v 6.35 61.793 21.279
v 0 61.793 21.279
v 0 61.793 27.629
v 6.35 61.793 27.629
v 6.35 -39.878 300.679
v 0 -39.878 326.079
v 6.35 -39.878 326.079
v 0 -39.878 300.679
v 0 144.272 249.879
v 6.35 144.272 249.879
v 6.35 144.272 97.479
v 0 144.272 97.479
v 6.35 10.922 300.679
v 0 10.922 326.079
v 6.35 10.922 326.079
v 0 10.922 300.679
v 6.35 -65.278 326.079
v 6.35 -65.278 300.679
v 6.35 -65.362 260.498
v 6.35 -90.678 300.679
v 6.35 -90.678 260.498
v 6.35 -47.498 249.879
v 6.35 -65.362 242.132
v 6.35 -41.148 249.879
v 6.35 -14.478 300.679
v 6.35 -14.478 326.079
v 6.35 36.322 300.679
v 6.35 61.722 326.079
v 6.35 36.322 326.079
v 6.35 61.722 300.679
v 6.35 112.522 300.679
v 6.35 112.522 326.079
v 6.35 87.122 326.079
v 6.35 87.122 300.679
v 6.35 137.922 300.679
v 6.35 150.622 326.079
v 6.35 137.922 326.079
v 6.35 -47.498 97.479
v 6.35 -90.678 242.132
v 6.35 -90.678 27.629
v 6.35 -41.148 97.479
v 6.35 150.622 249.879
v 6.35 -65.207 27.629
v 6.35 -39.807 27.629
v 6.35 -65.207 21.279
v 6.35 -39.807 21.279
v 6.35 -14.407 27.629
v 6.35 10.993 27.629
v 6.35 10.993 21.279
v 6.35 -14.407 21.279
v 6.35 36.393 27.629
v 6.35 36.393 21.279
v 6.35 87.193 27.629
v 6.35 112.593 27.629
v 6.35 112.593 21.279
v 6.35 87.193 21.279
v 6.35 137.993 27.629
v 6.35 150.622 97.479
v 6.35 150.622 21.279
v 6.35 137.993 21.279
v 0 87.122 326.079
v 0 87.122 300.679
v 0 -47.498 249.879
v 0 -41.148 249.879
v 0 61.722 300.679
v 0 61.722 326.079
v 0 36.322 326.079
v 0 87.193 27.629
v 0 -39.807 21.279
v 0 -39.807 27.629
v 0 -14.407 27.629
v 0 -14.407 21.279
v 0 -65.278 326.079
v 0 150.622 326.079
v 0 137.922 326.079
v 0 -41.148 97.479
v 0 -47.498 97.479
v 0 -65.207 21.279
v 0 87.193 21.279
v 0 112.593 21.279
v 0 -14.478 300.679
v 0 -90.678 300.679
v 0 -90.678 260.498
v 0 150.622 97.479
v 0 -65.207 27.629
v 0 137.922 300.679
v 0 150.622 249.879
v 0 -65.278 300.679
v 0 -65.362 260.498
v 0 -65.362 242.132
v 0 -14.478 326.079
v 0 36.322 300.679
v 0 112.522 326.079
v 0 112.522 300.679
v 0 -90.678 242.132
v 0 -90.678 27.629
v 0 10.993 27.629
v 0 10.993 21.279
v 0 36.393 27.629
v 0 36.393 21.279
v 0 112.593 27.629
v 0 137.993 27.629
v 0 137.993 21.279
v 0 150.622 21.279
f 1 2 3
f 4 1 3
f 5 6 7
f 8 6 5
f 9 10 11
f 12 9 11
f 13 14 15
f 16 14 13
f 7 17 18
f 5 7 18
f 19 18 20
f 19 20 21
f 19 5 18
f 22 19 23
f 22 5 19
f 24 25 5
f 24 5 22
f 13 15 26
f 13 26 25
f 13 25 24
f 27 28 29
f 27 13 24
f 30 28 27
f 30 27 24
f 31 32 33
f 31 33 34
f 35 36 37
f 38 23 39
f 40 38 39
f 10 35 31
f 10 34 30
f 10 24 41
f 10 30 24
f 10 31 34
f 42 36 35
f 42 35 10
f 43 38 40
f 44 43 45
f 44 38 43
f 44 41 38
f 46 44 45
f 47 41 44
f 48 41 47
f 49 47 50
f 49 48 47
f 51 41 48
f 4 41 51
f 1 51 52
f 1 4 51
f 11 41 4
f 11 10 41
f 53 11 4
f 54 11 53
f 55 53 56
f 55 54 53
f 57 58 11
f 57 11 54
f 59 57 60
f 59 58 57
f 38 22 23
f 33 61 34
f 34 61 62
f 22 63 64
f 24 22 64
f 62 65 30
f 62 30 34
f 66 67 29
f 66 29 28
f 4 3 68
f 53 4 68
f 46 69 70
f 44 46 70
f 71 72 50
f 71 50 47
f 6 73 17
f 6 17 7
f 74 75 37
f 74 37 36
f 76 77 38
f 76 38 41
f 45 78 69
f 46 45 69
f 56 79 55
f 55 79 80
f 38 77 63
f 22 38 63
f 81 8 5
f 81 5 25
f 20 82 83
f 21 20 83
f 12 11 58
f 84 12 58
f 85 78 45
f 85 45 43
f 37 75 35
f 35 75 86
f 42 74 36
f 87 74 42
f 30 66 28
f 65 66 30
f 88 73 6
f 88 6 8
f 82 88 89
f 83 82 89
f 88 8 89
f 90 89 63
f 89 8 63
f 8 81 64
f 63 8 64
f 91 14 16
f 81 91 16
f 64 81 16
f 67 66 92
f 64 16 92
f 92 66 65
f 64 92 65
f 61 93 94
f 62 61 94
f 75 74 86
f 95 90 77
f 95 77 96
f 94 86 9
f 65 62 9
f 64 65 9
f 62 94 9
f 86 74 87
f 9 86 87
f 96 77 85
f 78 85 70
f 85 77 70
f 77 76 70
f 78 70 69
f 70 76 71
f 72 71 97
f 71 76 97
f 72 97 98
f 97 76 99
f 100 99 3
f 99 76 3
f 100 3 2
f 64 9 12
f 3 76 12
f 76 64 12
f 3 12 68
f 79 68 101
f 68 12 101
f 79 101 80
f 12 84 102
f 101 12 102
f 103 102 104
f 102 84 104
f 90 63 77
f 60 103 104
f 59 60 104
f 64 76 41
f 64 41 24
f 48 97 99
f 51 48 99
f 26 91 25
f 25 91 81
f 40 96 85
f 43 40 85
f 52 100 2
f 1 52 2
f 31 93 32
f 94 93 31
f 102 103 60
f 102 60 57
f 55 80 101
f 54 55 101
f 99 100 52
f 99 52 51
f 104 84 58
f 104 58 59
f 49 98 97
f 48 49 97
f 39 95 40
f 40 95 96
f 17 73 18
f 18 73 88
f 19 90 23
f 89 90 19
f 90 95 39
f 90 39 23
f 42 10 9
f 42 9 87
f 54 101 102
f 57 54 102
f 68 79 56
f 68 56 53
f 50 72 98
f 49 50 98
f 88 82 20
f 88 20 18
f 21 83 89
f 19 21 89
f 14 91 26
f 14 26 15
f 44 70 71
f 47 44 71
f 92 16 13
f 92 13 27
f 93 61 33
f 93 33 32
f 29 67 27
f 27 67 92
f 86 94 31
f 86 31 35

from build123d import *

# Parameters (mm, degrees)
SKETCH1_W                = 304.8
SKETCH1_H                = 241.3
BOSS_EXTRUDE4_DEPTH      = 6.35
SKETCH3_W                = 6.35
SKETCH3_H                = 25.470512821
SKETCH3_H_2              = 25.4
SMALL_TEETH_CUT_DEPTH    = 7.62
BIG_TEETH_CUT_DEPTH      = 360.242006362
BIG_TEETH_CUT_DEPTH_BACK = 360.242006362
BIG_TEETH_W              = 25.4
BIG_TEETH_H              = 25.4
SKETCH4_W                = 152.4
SKETCH4_H                = 6.35
CUT_EXTRUDE1_DEPTH       = 360.242006362
SKETCH5_W                = 18.365609198
SKETCH5_H                = 25.315792254
CUT_EXTRUDE2_DEPTH       = 360.242006362
SKETCH6_W                = 152.4
SKETCH6_H                = 6.35
CUT_EXTRUDE3_DEPTH       = 360.242006362


with BuildPart() as part:
    # Sketch1 → Boss-Extrude4 (new body)
    with BuildSketch(Plane(origin=(0, 0, 0), x_dir=(0, 0, -1), z_dir=(1, 0, 0))):
        with Locations((-173.678767452, 29.972488533)):
            Rectangle(SKETCH1_W, SKETCH1_H)
    extrude(amount=BOSS_EXTRUDE4_DEPTH)

    # Sketch3 → Small_teeth_cut (cut)
    with BuildSketch(Plane.ZY):
        with Locations((24.453767452, -77.942255057)):
            Rectangle(SKETCH3_W, SKETCH3_H)
        with Locations((24.453767452, -27.106998646)):
            Rectangle(SKETCH3_W, SKETCH3_H_2)
        with Locations((24.453767452, 23.693001354)):
            Rectangle(SKETCH3_W, SKETCH3_H_2)
        with Locations((24.453767452, 74.493001354)):
            Rectangle(SKETCH3_W, SKETCH3_H_2)
        with Locations((24.453767452, 125.293001354)):
            Rectangle(SKETCH3_W, SKETCH3_H_2)
    extrude(amount=-SMALL_TEETH_CUT_DEPTH, mode=Mode.SUBTRACT)

    # big teeth → Big_teeth_cut (cut, two sides: drawn at the far end of the back side and taken through both)
    with BuildSketch(Plane(origin=(6.35, 0, 0), x_dir=(0, 0, -1), z_dir=(1, 0, 0)).offset(-BIG_TEETH_CUT_DEPTH_BACK)):
        with Locations((-313.378767452, -77.977511467)):
            Rectangle(BIG_TEETH_W, BIG_TEETH_H)
        with Locations((-313.378767452, -27.177511467)):
            Rectangle(BIG_TEETH_W, BIG_TEETH_H)
        with Locations((-313.378767452, 23.622488533)):
            Rectangle(BIG_TEETH_W, BIG_TEETH_H)
        with Locations((-313.378767452, 74.422488533)):
            Rectangle(BIG_TEETH_W, BIG_TEETH_H)
        with Locations((-313.378767452, 125.222488533)):
            Rectangle(BIG_TEETH_W, BIG_TEETH_H)
    extrude(amount=BIG_TEETH_CUT_DEPTH + BIG_TEETH_CUT_DEPTH_BACK, mode=Mode.SUBTRACT)

    # Sketch4 → Cut-Extrude1 (cut, through all)
    with BuildSketch(Plane(origin=(6.35, 0, 0), x_dir=(0, 0, -1), z_dir=(1, 0, 0))):
        with Locations((-173.678767452, 147.447488533)):
            Rectangle(SKETCH4_W, SKETCH4_H)
    extrude(amount=-CUT_EXTRUDE1_DEPTH, mode=Mode.SUBTRACT)

    # Sketch5 → Cut-Extrude2 (cut, through all)
    with BuildSketch(Plane.ZY):
        with Locations((251.315206335, -78.01961534)):
            Rectangle(SKETCH5_W, SKETCH5_H)
    extrude(amount=-CUT_EXTRUDE2_DEPTH, mode=Mode.SUBTRACT)

    # Sketch6 → Cut-Extrude3 (cut, through all)
    with BuildSketch(Plane.ZY):
        with Locations((173.678767452, -44.322511467)):
            Rectangle(SKETCH6_W, SKETCH6_H)
    extrude(amount=-CUT_EXTRUDE3_DEPTH, mode=Mode.SUBTRACT)


solid = part.part
